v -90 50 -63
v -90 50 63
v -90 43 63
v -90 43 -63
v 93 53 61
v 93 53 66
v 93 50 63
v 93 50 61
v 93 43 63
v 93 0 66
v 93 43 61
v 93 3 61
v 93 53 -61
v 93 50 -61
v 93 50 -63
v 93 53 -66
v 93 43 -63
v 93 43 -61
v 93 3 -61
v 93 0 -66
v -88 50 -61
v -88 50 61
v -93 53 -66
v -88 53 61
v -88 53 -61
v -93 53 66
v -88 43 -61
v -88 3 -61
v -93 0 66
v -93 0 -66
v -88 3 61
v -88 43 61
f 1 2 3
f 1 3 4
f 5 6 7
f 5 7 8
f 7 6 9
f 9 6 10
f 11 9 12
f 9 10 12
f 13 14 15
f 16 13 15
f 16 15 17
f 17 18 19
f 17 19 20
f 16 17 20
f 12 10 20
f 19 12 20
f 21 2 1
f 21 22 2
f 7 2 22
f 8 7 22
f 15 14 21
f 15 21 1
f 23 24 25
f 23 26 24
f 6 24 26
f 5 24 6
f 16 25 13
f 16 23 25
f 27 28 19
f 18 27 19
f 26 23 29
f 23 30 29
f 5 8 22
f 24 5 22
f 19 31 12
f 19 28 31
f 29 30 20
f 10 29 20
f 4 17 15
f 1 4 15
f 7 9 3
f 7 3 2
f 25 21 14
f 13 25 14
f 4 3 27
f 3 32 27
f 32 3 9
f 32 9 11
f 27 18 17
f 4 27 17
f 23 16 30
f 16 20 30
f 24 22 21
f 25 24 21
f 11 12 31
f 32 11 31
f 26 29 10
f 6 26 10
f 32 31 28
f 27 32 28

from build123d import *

# Parameters (mm, degrees)
ESQUISSE1_W             = 186
ESQUISSE1_H             = 132
BOSS_EXTRU_1_DEPTH      = 3
ESQUISSE4_W             = 5
ESQUISSE4_H             = 122
BOSS_EXTRU_4_DEPTH      = 50
ESQUISSE5_W             = 126
ESQUISSE5_H             = 7
ENL_V_MAT_EXTRU_1_DEPTH = 183


with BuildPart() as part:
    # Esquisse1 → Boss.-Extru.1 (new body)
    with BuildSketch(Plane(origin=(0, 0, 0), x_dir=(1, 0, 0), z_dir=(0, 1, 0))):
        Rectangle(ESQUISSE1_W, ESQUISSE1_H)
    extrude(amount=BOSS_EXTRU_1_DEPTH)

    # Esquisse4 → Boss.-Extru.4 (add)
    with BuildSketch(Plane(origin=(0, 3, 0), x_dir=(1, 0, 0), z_dir=(0, 1, 0))):
        Polygon((93, 61), (93, 66), (-93, 66), (-93, 61), (-88, 61), align=None)
        with Locations((-90.5, 0)):
            Rectangle(ESQUISSE4_W, ESQUISSE4_H)
        Polygon((93, -66), (93, -61), (-88, -61), (-93, -61), (-93, -66), align=None)
    extrude(amount=BOSS_EXTRU_4_DEPTH)

    # Esquisse5 → Enlèv. mat.-Extru.1 (cut)
    with BuildSketch(Plane(origin=(93, 0, 0), x_dir=(0, 0, -1), z_dir=(1, 0, 0))):
        with Locations((0, 46.5)):
            Rectangle(ESQUISSE5_W, ESQUISSE5_H)
    extrude(amount=-ENL_V_MAT_EXTRU_1_DEPTH, mode=Mode.SUBTRACT)


solid = part.part
